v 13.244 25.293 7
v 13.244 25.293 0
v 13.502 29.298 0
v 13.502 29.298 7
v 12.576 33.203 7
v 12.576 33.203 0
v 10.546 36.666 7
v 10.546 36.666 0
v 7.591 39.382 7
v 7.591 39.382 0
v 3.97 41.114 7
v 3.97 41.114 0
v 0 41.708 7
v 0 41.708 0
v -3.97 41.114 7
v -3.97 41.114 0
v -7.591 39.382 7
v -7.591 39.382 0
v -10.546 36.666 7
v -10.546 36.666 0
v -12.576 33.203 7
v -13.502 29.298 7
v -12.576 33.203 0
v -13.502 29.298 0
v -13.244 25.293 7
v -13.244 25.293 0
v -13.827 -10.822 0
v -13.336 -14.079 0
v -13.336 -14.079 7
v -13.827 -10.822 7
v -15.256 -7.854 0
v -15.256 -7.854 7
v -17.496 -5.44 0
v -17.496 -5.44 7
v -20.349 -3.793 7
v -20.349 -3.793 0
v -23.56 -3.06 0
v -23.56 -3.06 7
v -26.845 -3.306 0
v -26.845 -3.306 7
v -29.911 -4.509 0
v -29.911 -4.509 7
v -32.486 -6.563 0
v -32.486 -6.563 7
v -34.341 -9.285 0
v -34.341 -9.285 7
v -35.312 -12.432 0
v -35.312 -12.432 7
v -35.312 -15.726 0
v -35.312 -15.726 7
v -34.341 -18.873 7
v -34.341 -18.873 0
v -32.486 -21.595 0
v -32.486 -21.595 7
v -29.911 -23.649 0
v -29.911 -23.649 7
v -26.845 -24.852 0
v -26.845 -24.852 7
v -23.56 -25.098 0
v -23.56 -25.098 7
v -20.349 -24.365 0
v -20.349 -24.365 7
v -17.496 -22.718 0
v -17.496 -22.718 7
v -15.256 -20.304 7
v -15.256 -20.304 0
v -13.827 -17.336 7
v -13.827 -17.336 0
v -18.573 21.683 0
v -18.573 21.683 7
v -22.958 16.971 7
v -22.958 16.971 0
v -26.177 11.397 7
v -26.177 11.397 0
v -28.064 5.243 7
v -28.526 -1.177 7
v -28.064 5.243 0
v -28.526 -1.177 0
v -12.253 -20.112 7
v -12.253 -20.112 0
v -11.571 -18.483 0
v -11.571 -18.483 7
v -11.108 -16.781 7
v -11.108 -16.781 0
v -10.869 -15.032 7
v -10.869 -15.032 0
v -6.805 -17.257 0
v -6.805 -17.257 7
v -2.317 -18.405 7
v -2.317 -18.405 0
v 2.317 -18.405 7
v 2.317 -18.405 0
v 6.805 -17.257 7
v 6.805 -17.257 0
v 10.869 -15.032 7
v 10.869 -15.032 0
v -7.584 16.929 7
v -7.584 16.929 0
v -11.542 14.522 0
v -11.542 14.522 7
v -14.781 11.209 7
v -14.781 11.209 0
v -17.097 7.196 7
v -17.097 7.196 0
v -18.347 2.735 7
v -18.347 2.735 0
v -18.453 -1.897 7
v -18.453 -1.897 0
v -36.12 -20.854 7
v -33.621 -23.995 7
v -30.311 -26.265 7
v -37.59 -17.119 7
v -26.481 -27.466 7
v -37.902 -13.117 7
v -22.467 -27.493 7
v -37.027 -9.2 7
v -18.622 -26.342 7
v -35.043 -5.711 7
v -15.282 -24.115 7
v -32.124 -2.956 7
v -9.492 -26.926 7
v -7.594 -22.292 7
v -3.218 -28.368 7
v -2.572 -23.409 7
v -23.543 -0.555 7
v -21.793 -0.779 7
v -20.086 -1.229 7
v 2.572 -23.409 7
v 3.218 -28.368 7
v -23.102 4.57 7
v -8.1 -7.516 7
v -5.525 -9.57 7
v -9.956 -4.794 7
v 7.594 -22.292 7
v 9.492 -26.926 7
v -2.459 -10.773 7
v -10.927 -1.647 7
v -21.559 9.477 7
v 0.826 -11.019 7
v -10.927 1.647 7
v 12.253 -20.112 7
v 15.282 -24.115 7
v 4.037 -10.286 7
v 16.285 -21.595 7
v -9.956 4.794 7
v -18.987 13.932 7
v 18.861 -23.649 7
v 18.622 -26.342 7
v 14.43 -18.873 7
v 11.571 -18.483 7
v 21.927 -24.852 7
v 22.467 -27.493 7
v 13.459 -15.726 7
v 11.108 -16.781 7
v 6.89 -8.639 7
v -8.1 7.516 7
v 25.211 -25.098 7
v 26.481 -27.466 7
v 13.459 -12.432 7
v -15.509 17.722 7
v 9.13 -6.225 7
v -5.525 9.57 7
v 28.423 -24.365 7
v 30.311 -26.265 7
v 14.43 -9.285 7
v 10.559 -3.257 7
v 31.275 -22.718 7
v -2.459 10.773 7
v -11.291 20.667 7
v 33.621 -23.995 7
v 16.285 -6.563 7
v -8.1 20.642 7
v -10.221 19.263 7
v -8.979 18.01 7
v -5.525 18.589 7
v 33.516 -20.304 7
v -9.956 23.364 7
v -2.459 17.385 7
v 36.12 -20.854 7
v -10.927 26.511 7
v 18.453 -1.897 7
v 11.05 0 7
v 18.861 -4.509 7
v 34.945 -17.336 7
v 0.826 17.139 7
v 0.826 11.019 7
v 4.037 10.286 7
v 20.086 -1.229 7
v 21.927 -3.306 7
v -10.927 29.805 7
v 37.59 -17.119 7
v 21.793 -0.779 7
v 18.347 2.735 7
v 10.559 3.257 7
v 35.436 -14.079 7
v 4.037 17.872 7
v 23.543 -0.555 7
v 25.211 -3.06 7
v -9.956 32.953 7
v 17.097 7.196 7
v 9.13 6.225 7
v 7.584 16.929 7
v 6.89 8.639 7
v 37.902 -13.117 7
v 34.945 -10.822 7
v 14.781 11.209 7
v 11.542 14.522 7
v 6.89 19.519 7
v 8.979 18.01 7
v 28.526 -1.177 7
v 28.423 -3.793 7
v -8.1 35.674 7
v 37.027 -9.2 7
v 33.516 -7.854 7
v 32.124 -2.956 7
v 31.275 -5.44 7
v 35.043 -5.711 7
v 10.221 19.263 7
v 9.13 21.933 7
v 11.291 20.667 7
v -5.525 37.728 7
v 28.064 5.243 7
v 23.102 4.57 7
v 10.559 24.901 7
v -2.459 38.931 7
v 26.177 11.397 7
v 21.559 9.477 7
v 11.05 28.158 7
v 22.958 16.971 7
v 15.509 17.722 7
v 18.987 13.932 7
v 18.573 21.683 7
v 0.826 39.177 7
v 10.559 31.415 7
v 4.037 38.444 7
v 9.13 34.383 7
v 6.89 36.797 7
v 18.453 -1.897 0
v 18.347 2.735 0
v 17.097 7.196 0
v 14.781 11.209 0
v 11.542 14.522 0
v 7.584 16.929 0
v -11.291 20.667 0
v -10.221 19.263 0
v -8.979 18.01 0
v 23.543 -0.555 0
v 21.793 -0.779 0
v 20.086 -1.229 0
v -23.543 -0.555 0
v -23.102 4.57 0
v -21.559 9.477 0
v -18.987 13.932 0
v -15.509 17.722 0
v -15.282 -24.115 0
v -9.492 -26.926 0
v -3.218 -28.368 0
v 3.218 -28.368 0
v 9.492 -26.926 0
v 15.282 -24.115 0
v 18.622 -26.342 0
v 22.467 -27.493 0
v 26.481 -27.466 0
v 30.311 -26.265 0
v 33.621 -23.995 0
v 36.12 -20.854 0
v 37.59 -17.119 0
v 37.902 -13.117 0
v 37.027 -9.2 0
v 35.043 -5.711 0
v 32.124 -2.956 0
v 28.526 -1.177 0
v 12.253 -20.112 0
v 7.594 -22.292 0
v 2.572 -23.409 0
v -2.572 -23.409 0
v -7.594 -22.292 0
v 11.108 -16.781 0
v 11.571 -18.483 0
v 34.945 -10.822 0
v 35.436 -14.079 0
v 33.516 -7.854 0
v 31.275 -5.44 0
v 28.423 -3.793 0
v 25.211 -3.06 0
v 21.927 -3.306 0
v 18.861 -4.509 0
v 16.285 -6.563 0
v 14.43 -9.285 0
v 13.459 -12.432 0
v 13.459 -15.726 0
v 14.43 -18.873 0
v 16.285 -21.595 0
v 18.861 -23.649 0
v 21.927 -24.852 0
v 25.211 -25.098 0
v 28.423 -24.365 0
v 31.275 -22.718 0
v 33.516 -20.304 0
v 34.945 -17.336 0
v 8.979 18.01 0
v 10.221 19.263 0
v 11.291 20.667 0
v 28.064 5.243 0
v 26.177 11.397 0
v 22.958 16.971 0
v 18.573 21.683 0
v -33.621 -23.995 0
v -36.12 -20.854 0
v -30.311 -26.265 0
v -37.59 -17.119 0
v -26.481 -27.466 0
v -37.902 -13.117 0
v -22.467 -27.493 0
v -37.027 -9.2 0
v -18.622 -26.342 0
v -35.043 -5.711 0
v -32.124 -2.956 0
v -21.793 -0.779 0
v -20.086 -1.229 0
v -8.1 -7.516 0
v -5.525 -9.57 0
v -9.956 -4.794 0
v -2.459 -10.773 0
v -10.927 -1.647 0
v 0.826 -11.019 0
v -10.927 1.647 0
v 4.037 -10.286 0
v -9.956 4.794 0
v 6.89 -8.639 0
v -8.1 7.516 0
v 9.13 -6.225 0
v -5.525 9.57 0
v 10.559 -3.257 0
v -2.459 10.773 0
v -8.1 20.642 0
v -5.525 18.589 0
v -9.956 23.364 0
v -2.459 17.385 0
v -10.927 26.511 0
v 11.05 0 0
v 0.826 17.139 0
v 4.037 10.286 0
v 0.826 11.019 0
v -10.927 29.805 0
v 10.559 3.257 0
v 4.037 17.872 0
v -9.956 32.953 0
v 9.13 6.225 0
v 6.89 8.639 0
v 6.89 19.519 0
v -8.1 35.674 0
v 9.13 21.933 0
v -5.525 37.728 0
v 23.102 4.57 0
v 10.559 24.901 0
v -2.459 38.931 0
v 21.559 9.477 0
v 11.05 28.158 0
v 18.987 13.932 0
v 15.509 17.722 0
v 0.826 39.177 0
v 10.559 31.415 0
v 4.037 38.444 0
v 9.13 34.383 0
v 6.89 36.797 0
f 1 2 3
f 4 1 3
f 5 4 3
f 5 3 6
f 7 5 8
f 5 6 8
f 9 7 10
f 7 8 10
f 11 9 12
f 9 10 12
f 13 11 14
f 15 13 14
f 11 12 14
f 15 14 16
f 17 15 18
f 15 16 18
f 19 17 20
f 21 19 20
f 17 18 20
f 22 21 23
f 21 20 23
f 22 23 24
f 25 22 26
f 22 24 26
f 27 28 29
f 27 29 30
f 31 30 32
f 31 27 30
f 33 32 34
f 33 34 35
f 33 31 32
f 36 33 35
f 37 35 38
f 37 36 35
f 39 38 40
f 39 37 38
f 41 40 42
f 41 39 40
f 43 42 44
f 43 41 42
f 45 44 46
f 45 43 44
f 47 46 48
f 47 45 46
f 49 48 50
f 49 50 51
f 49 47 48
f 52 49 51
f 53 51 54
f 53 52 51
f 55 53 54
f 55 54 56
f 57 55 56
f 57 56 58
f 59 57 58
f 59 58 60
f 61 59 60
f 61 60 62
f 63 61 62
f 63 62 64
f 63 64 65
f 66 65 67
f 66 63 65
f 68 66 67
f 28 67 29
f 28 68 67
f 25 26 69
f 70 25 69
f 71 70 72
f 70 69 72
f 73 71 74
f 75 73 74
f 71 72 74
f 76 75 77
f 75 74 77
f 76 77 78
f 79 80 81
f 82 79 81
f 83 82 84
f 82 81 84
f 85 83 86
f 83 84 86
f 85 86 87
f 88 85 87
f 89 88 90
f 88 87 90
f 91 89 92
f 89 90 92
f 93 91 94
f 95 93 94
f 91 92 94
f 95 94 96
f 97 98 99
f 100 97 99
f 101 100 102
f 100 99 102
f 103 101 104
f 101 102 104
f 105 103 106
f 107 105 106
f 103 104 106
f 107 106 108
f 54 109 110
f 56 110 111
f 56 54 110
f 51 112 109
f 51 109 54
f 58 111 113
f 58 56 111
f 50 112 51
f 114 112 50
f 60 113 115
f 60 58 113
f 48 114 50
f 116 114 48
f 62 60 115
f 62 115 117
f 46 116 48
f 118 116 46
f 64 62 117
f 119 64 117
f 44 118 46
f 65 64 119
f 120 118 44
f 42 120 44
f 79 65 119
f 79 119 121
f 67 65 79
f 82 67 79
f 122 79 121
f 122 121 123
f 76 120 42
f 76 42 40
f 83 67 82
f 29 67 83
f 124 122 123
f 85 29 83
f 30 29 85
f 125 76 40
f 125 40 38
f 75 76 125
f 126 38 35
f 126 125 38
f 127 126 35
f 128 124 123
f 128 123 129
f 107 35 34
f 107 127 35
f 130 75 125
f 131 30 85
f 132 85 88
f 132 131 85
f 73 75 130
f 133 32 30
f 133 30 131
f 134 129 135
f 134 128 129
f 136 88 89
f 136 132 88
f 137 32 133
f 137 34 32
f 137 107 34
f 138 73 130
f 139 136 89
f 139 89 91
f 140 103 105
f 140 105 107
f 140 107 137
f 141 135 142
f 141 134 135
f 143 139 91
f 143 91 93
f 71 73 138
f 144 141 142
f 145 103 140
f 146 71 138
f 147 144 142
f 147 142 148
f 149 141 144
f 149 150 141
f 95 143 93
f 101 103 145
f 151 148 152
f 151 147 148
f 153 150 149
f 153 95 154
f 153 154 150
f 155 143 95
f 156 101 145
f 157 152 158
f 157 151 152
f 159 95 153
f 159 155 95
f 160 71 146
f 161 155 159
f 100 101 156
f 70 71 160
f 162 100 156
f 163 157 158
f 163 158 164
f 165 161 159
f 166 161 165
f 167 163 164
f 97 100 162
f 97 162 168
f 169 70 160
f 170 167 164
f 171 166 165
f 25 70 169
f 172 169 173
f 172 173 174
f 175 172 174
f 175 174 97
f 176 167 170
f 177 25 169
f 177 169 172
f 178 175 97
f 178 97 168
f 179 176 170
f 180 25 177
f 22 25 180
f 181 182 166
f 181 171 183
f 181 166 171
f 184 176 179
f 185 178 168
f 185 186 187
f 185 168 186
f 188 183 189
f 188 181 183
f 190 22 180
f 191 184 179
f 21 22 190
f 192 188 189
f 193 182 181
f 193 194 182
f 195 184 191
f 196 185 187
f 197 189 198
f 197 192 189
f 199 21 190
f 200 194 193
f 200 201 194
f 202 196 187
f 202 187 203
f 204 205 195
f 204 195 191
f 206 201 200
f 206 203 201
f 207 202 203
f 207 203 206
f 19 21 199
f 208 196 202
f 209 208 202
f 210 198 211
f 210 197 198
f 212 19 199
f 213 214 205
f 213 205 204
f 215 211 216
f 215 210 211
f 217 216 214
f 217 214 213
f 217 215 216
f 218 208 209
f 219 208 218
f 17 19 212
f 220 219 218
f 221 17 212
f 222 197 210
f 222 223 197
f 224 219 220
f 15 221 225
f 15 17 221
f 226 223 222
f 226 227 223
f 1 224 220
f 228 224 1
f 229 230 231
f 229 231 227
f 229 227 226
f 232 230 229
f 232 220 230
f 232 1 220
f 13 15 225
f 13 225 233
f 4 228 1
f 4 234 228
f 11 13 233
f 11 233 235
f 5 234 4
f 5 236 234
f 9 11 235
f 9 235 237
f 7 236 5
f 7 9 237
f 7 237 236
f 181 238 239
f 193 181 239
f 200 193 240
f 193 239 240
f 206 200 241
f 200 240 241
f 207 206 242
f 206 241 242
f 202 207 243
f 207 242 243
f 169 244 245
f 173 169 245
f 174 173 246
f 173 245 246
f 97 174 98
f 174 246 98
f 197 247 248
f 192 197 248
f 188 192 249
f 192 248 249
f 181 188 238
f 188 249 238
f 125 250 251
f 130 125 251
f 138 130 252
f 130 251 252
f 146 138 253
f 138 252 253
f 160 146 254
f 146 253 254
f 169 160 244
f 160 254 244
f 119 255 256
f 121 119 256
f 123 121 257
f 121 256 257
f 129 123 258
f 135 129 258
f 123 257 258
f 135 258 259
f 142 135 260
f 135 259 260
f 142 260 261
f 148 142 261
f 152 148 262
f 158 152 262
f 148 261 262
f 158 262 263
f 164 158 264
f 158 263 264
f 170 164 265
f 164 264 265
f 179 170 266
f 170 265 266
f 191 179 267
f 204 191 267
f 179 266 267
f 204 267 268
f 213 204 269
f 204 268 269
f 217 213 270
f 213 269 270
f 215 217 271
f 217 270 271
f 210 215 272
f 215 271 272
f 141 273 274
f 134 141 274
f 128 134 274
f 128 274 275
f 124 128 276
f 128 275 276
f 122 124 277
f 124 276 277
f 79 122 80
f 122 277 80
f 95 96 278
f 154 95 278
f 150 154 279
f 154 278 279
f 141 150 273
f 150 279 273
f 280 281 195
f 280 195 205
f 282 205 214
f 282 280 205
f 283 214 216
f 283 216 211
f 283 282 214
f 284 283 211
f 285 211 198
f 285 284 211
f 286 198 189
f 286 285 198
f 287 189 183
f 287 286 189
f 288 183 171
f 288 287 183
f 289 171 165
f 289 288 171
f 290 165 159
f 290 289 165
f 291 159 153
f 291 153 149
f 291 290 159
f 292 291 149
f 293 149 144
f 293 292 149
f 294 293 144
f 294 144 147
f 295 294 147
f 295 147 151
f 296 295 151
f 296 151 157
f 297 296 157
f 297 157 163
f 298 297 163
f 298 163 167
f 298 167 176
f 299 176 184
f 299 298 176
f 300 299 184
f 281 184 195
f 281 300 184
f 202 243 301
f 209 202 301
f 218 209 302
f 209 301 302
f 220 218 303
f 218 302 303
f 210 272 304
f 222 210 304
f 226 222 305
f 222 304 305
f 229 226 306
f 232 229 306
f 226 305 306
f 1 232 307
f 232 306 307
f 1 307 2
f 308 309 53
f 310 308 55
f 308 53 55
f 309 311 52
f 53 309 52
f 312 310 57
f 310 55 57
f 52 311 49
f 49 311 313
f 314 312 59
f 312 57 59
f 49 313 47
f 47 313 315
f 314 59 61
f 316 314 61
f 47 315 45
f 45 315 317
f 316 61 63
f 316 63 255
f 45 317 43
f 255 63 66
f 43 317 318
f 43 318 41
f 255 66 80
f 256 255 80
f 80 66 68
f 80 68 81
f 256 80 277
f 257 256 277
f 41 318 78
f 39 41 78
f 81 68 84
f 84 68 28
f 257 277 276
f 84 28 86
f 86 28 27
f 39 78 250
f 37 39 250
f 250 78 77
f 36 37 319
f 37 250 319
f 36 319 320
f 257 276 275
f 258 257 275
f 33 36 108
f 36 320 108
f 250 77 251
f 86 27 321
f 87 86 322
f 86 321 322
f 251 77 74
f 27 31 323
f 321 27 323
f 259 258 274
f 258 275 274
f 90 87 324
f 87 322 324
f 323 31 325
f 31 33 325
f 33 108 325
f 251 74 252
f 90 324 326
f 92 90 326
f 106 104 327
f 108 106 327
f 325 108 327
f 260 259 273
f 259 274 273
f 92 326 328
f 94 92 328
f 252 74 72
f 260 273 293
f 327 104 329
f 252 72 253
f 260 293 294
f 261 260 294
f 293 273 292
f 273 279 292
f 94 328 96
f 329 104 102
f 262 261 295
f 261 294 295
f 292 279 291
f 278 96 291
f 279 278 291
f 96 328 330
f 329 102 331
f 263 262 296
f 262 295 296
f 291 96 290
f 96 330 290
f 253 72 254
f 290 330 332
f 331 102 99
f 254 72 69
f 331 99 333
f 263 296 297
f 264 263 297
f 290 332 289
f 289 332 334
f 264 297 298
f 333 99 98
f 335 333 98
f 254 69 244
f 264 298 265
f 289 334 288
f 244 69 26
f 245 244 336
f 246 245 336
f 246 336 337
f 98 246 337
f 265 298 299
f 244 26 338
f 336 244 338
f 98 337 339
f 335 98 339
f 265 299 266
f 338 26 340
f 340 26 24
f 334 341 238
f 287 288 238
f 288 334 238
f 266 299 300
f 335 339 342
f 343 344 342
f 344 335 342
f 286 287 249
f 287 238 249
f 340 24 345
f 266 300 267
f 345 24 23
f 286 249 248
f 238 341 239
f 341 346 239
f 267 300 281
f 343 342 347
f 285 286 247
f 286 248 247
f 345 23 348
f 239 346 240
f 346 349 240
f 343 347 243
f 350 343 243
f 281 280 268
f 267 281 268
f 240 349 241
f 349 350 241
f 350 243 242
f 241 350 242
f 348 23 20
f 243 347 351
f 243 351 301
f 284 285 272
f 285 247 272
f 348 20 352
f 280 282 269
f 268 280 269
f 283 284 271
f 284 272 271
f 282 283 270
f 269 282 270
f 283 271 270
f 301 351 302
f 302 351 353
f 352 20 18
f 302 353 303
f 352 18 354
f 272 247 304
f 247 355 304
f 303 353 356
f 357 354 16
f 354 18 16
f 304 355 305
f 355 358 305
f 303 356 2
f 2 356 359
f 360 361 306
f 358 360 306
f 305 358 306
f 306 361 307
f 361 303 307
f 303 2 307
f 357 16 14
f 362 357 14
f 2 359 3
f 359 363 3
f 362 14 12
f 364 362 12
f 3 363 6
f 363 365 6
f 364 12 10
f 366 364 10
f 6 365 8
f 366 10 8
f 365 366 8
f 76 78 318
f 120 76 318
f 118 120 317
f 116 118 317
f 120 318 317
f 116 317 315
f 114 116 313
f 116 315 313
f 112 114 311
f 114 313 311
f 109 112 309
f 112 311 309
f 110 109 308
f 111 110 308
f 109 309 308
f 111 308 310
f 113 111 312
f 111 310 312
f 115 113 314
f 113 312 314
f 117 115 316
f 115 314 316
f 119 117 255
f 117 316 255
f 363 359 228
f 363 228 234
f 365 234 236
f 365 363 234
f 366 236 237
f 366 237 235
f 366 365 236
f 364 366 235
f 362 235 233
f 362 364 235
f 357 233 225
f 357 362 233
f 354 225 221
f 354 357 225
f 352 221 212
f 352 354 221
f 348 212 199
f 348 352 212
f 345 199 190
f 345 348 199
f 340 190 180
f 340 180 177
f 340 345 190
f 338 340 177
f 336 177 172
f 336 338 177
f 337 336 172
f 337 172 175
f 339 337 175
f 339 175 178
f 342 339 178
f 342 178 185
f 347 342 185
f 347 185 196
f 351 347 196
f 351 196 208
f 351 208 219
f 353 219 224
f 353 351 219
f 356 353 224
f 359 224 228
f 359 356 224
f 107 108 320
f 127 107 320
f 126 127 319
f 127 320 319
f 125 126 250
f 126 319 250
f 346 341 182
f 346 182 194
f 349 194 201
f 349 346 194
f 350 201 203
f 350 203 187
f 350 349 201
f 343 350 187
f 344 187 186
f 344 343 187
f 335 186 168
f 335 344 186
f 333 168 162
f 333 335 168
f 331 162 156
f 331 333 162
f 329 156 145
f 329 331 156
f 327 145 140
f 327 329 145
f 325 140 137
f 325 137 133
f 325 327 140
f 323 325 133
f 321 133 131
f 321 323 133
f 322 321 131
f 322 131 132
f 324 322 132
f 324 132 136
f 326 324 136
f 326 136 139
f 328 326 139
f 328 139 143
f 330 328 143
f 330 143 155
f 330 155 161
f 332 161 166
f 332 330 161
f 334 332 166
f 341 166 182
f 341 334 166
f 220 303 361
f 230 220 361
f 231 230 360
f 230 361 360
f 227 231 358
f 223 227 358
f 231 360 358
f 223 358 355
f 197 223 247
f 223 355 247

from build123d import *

# Parameters (mm, degrees)
F0_R     = 11.05
F0_R_2   = 13.55
F1_DEPTH = 7


with BuildPart() as f1:
    # F0 (on Top) → F1 (new body)
    with BuildSketch(Plane.XY):
        with BuildLine():
            ThreePointArc((28.525726, -1.177043), (24.725025, 14.275), (13.243514, 25.292525))
            ThreePointArc((13.243514, 25.292525), (0, 41.708154), (-13.243514, 25.292525))
            ThreePointArc((-13.243514, 25.292525), (-24.725025, 14.275), (-28.525726, -1.177043))
            ThreePointArc((-28.525726, -1.177043), (-36.120321, -20.854077), (-15.282212, -24.115482))
            ThreePointArc((-15.282212, -24.115482), (0, -28.55), (15.282212, -24.115482))
            ThreePointArc((15.282212, -24.115482), (36.120321, -20.854077), (28.525726, -1.177043))
        make_face()
        with Locations((-24.385677, -14.079077)):
            Circle(F0_R, mode=Mode.SUBTRACT)
        with BuildLine():
            ThreePointArc((12.252611, -20.111589), (0, -23.55), (-12.252611, -20.111589))
            ThreePointArc((-12.252611, -20.111589), (-11.311855, -17.639648), (-10.869229, -15.032044))
            ThreePointArc((-10.869229, -15.032044), (0, -18.55), (10.869229, -15.032044))
            ThreePointArc((10.869229, -15.032044), (11.311855, -17.639648), (12.252611, -20.111589))
        make_face(mode=Mode.SUBTRACT)
        with Locations((24.385677, -14.079077)):
            Circle(F0_R, mode=Mode.SUBTRACT)
        Circle(F0_R_2, mode=Mode.SUBTRACT)
        with BuildLine():
            ThreePointArc((-23.543453, -0.555277), (-20.394898, 11.775), (-11.290842, 20.666867))
            ThreePointArc((-11.290842, 20.666867), (-9.620456, 18.616177), (-7.583517, 16.929051))
            ThreePointArc((-7.583517, 16.929051), (-16.064771, 9.275), (-18.452747, -1.897007))
            ThreePointArc((-18.452747, -1.897007), (-20.932311, -0.976529), (-23.543453, -0.555277))
        make_face(mode=Mode.SUBTRACT)
        with BuildLine():
            ThreePointArc((23.543453, -0.555277), (20.932311, -0.976529), (18.452747, -1.897007))
            ThreePointArc((18.452747, -1.897007), (16.064771, 9.275), (7.583517, 16.929051))
            ThreePointArc((7.583517, 16.929051), (9.620456, 18.616177), (11.290842, 20.666867))
            ThreePointArc((11.290842, 20.666867), (20.394898, 11.775), (23.543453, -0.555277))
        make_face(mode=Mode.SUBTRACT)
        with Locations((0, 28.158154)):
            Circle(F0_R, mode=Mode.SUBTRACT)
        Circle(F0_R_2)
        Circle(F0_R, mode=Mode.SUBTRACT)
    extrude(amount=F1_DEPTH)


solid = f1.part
